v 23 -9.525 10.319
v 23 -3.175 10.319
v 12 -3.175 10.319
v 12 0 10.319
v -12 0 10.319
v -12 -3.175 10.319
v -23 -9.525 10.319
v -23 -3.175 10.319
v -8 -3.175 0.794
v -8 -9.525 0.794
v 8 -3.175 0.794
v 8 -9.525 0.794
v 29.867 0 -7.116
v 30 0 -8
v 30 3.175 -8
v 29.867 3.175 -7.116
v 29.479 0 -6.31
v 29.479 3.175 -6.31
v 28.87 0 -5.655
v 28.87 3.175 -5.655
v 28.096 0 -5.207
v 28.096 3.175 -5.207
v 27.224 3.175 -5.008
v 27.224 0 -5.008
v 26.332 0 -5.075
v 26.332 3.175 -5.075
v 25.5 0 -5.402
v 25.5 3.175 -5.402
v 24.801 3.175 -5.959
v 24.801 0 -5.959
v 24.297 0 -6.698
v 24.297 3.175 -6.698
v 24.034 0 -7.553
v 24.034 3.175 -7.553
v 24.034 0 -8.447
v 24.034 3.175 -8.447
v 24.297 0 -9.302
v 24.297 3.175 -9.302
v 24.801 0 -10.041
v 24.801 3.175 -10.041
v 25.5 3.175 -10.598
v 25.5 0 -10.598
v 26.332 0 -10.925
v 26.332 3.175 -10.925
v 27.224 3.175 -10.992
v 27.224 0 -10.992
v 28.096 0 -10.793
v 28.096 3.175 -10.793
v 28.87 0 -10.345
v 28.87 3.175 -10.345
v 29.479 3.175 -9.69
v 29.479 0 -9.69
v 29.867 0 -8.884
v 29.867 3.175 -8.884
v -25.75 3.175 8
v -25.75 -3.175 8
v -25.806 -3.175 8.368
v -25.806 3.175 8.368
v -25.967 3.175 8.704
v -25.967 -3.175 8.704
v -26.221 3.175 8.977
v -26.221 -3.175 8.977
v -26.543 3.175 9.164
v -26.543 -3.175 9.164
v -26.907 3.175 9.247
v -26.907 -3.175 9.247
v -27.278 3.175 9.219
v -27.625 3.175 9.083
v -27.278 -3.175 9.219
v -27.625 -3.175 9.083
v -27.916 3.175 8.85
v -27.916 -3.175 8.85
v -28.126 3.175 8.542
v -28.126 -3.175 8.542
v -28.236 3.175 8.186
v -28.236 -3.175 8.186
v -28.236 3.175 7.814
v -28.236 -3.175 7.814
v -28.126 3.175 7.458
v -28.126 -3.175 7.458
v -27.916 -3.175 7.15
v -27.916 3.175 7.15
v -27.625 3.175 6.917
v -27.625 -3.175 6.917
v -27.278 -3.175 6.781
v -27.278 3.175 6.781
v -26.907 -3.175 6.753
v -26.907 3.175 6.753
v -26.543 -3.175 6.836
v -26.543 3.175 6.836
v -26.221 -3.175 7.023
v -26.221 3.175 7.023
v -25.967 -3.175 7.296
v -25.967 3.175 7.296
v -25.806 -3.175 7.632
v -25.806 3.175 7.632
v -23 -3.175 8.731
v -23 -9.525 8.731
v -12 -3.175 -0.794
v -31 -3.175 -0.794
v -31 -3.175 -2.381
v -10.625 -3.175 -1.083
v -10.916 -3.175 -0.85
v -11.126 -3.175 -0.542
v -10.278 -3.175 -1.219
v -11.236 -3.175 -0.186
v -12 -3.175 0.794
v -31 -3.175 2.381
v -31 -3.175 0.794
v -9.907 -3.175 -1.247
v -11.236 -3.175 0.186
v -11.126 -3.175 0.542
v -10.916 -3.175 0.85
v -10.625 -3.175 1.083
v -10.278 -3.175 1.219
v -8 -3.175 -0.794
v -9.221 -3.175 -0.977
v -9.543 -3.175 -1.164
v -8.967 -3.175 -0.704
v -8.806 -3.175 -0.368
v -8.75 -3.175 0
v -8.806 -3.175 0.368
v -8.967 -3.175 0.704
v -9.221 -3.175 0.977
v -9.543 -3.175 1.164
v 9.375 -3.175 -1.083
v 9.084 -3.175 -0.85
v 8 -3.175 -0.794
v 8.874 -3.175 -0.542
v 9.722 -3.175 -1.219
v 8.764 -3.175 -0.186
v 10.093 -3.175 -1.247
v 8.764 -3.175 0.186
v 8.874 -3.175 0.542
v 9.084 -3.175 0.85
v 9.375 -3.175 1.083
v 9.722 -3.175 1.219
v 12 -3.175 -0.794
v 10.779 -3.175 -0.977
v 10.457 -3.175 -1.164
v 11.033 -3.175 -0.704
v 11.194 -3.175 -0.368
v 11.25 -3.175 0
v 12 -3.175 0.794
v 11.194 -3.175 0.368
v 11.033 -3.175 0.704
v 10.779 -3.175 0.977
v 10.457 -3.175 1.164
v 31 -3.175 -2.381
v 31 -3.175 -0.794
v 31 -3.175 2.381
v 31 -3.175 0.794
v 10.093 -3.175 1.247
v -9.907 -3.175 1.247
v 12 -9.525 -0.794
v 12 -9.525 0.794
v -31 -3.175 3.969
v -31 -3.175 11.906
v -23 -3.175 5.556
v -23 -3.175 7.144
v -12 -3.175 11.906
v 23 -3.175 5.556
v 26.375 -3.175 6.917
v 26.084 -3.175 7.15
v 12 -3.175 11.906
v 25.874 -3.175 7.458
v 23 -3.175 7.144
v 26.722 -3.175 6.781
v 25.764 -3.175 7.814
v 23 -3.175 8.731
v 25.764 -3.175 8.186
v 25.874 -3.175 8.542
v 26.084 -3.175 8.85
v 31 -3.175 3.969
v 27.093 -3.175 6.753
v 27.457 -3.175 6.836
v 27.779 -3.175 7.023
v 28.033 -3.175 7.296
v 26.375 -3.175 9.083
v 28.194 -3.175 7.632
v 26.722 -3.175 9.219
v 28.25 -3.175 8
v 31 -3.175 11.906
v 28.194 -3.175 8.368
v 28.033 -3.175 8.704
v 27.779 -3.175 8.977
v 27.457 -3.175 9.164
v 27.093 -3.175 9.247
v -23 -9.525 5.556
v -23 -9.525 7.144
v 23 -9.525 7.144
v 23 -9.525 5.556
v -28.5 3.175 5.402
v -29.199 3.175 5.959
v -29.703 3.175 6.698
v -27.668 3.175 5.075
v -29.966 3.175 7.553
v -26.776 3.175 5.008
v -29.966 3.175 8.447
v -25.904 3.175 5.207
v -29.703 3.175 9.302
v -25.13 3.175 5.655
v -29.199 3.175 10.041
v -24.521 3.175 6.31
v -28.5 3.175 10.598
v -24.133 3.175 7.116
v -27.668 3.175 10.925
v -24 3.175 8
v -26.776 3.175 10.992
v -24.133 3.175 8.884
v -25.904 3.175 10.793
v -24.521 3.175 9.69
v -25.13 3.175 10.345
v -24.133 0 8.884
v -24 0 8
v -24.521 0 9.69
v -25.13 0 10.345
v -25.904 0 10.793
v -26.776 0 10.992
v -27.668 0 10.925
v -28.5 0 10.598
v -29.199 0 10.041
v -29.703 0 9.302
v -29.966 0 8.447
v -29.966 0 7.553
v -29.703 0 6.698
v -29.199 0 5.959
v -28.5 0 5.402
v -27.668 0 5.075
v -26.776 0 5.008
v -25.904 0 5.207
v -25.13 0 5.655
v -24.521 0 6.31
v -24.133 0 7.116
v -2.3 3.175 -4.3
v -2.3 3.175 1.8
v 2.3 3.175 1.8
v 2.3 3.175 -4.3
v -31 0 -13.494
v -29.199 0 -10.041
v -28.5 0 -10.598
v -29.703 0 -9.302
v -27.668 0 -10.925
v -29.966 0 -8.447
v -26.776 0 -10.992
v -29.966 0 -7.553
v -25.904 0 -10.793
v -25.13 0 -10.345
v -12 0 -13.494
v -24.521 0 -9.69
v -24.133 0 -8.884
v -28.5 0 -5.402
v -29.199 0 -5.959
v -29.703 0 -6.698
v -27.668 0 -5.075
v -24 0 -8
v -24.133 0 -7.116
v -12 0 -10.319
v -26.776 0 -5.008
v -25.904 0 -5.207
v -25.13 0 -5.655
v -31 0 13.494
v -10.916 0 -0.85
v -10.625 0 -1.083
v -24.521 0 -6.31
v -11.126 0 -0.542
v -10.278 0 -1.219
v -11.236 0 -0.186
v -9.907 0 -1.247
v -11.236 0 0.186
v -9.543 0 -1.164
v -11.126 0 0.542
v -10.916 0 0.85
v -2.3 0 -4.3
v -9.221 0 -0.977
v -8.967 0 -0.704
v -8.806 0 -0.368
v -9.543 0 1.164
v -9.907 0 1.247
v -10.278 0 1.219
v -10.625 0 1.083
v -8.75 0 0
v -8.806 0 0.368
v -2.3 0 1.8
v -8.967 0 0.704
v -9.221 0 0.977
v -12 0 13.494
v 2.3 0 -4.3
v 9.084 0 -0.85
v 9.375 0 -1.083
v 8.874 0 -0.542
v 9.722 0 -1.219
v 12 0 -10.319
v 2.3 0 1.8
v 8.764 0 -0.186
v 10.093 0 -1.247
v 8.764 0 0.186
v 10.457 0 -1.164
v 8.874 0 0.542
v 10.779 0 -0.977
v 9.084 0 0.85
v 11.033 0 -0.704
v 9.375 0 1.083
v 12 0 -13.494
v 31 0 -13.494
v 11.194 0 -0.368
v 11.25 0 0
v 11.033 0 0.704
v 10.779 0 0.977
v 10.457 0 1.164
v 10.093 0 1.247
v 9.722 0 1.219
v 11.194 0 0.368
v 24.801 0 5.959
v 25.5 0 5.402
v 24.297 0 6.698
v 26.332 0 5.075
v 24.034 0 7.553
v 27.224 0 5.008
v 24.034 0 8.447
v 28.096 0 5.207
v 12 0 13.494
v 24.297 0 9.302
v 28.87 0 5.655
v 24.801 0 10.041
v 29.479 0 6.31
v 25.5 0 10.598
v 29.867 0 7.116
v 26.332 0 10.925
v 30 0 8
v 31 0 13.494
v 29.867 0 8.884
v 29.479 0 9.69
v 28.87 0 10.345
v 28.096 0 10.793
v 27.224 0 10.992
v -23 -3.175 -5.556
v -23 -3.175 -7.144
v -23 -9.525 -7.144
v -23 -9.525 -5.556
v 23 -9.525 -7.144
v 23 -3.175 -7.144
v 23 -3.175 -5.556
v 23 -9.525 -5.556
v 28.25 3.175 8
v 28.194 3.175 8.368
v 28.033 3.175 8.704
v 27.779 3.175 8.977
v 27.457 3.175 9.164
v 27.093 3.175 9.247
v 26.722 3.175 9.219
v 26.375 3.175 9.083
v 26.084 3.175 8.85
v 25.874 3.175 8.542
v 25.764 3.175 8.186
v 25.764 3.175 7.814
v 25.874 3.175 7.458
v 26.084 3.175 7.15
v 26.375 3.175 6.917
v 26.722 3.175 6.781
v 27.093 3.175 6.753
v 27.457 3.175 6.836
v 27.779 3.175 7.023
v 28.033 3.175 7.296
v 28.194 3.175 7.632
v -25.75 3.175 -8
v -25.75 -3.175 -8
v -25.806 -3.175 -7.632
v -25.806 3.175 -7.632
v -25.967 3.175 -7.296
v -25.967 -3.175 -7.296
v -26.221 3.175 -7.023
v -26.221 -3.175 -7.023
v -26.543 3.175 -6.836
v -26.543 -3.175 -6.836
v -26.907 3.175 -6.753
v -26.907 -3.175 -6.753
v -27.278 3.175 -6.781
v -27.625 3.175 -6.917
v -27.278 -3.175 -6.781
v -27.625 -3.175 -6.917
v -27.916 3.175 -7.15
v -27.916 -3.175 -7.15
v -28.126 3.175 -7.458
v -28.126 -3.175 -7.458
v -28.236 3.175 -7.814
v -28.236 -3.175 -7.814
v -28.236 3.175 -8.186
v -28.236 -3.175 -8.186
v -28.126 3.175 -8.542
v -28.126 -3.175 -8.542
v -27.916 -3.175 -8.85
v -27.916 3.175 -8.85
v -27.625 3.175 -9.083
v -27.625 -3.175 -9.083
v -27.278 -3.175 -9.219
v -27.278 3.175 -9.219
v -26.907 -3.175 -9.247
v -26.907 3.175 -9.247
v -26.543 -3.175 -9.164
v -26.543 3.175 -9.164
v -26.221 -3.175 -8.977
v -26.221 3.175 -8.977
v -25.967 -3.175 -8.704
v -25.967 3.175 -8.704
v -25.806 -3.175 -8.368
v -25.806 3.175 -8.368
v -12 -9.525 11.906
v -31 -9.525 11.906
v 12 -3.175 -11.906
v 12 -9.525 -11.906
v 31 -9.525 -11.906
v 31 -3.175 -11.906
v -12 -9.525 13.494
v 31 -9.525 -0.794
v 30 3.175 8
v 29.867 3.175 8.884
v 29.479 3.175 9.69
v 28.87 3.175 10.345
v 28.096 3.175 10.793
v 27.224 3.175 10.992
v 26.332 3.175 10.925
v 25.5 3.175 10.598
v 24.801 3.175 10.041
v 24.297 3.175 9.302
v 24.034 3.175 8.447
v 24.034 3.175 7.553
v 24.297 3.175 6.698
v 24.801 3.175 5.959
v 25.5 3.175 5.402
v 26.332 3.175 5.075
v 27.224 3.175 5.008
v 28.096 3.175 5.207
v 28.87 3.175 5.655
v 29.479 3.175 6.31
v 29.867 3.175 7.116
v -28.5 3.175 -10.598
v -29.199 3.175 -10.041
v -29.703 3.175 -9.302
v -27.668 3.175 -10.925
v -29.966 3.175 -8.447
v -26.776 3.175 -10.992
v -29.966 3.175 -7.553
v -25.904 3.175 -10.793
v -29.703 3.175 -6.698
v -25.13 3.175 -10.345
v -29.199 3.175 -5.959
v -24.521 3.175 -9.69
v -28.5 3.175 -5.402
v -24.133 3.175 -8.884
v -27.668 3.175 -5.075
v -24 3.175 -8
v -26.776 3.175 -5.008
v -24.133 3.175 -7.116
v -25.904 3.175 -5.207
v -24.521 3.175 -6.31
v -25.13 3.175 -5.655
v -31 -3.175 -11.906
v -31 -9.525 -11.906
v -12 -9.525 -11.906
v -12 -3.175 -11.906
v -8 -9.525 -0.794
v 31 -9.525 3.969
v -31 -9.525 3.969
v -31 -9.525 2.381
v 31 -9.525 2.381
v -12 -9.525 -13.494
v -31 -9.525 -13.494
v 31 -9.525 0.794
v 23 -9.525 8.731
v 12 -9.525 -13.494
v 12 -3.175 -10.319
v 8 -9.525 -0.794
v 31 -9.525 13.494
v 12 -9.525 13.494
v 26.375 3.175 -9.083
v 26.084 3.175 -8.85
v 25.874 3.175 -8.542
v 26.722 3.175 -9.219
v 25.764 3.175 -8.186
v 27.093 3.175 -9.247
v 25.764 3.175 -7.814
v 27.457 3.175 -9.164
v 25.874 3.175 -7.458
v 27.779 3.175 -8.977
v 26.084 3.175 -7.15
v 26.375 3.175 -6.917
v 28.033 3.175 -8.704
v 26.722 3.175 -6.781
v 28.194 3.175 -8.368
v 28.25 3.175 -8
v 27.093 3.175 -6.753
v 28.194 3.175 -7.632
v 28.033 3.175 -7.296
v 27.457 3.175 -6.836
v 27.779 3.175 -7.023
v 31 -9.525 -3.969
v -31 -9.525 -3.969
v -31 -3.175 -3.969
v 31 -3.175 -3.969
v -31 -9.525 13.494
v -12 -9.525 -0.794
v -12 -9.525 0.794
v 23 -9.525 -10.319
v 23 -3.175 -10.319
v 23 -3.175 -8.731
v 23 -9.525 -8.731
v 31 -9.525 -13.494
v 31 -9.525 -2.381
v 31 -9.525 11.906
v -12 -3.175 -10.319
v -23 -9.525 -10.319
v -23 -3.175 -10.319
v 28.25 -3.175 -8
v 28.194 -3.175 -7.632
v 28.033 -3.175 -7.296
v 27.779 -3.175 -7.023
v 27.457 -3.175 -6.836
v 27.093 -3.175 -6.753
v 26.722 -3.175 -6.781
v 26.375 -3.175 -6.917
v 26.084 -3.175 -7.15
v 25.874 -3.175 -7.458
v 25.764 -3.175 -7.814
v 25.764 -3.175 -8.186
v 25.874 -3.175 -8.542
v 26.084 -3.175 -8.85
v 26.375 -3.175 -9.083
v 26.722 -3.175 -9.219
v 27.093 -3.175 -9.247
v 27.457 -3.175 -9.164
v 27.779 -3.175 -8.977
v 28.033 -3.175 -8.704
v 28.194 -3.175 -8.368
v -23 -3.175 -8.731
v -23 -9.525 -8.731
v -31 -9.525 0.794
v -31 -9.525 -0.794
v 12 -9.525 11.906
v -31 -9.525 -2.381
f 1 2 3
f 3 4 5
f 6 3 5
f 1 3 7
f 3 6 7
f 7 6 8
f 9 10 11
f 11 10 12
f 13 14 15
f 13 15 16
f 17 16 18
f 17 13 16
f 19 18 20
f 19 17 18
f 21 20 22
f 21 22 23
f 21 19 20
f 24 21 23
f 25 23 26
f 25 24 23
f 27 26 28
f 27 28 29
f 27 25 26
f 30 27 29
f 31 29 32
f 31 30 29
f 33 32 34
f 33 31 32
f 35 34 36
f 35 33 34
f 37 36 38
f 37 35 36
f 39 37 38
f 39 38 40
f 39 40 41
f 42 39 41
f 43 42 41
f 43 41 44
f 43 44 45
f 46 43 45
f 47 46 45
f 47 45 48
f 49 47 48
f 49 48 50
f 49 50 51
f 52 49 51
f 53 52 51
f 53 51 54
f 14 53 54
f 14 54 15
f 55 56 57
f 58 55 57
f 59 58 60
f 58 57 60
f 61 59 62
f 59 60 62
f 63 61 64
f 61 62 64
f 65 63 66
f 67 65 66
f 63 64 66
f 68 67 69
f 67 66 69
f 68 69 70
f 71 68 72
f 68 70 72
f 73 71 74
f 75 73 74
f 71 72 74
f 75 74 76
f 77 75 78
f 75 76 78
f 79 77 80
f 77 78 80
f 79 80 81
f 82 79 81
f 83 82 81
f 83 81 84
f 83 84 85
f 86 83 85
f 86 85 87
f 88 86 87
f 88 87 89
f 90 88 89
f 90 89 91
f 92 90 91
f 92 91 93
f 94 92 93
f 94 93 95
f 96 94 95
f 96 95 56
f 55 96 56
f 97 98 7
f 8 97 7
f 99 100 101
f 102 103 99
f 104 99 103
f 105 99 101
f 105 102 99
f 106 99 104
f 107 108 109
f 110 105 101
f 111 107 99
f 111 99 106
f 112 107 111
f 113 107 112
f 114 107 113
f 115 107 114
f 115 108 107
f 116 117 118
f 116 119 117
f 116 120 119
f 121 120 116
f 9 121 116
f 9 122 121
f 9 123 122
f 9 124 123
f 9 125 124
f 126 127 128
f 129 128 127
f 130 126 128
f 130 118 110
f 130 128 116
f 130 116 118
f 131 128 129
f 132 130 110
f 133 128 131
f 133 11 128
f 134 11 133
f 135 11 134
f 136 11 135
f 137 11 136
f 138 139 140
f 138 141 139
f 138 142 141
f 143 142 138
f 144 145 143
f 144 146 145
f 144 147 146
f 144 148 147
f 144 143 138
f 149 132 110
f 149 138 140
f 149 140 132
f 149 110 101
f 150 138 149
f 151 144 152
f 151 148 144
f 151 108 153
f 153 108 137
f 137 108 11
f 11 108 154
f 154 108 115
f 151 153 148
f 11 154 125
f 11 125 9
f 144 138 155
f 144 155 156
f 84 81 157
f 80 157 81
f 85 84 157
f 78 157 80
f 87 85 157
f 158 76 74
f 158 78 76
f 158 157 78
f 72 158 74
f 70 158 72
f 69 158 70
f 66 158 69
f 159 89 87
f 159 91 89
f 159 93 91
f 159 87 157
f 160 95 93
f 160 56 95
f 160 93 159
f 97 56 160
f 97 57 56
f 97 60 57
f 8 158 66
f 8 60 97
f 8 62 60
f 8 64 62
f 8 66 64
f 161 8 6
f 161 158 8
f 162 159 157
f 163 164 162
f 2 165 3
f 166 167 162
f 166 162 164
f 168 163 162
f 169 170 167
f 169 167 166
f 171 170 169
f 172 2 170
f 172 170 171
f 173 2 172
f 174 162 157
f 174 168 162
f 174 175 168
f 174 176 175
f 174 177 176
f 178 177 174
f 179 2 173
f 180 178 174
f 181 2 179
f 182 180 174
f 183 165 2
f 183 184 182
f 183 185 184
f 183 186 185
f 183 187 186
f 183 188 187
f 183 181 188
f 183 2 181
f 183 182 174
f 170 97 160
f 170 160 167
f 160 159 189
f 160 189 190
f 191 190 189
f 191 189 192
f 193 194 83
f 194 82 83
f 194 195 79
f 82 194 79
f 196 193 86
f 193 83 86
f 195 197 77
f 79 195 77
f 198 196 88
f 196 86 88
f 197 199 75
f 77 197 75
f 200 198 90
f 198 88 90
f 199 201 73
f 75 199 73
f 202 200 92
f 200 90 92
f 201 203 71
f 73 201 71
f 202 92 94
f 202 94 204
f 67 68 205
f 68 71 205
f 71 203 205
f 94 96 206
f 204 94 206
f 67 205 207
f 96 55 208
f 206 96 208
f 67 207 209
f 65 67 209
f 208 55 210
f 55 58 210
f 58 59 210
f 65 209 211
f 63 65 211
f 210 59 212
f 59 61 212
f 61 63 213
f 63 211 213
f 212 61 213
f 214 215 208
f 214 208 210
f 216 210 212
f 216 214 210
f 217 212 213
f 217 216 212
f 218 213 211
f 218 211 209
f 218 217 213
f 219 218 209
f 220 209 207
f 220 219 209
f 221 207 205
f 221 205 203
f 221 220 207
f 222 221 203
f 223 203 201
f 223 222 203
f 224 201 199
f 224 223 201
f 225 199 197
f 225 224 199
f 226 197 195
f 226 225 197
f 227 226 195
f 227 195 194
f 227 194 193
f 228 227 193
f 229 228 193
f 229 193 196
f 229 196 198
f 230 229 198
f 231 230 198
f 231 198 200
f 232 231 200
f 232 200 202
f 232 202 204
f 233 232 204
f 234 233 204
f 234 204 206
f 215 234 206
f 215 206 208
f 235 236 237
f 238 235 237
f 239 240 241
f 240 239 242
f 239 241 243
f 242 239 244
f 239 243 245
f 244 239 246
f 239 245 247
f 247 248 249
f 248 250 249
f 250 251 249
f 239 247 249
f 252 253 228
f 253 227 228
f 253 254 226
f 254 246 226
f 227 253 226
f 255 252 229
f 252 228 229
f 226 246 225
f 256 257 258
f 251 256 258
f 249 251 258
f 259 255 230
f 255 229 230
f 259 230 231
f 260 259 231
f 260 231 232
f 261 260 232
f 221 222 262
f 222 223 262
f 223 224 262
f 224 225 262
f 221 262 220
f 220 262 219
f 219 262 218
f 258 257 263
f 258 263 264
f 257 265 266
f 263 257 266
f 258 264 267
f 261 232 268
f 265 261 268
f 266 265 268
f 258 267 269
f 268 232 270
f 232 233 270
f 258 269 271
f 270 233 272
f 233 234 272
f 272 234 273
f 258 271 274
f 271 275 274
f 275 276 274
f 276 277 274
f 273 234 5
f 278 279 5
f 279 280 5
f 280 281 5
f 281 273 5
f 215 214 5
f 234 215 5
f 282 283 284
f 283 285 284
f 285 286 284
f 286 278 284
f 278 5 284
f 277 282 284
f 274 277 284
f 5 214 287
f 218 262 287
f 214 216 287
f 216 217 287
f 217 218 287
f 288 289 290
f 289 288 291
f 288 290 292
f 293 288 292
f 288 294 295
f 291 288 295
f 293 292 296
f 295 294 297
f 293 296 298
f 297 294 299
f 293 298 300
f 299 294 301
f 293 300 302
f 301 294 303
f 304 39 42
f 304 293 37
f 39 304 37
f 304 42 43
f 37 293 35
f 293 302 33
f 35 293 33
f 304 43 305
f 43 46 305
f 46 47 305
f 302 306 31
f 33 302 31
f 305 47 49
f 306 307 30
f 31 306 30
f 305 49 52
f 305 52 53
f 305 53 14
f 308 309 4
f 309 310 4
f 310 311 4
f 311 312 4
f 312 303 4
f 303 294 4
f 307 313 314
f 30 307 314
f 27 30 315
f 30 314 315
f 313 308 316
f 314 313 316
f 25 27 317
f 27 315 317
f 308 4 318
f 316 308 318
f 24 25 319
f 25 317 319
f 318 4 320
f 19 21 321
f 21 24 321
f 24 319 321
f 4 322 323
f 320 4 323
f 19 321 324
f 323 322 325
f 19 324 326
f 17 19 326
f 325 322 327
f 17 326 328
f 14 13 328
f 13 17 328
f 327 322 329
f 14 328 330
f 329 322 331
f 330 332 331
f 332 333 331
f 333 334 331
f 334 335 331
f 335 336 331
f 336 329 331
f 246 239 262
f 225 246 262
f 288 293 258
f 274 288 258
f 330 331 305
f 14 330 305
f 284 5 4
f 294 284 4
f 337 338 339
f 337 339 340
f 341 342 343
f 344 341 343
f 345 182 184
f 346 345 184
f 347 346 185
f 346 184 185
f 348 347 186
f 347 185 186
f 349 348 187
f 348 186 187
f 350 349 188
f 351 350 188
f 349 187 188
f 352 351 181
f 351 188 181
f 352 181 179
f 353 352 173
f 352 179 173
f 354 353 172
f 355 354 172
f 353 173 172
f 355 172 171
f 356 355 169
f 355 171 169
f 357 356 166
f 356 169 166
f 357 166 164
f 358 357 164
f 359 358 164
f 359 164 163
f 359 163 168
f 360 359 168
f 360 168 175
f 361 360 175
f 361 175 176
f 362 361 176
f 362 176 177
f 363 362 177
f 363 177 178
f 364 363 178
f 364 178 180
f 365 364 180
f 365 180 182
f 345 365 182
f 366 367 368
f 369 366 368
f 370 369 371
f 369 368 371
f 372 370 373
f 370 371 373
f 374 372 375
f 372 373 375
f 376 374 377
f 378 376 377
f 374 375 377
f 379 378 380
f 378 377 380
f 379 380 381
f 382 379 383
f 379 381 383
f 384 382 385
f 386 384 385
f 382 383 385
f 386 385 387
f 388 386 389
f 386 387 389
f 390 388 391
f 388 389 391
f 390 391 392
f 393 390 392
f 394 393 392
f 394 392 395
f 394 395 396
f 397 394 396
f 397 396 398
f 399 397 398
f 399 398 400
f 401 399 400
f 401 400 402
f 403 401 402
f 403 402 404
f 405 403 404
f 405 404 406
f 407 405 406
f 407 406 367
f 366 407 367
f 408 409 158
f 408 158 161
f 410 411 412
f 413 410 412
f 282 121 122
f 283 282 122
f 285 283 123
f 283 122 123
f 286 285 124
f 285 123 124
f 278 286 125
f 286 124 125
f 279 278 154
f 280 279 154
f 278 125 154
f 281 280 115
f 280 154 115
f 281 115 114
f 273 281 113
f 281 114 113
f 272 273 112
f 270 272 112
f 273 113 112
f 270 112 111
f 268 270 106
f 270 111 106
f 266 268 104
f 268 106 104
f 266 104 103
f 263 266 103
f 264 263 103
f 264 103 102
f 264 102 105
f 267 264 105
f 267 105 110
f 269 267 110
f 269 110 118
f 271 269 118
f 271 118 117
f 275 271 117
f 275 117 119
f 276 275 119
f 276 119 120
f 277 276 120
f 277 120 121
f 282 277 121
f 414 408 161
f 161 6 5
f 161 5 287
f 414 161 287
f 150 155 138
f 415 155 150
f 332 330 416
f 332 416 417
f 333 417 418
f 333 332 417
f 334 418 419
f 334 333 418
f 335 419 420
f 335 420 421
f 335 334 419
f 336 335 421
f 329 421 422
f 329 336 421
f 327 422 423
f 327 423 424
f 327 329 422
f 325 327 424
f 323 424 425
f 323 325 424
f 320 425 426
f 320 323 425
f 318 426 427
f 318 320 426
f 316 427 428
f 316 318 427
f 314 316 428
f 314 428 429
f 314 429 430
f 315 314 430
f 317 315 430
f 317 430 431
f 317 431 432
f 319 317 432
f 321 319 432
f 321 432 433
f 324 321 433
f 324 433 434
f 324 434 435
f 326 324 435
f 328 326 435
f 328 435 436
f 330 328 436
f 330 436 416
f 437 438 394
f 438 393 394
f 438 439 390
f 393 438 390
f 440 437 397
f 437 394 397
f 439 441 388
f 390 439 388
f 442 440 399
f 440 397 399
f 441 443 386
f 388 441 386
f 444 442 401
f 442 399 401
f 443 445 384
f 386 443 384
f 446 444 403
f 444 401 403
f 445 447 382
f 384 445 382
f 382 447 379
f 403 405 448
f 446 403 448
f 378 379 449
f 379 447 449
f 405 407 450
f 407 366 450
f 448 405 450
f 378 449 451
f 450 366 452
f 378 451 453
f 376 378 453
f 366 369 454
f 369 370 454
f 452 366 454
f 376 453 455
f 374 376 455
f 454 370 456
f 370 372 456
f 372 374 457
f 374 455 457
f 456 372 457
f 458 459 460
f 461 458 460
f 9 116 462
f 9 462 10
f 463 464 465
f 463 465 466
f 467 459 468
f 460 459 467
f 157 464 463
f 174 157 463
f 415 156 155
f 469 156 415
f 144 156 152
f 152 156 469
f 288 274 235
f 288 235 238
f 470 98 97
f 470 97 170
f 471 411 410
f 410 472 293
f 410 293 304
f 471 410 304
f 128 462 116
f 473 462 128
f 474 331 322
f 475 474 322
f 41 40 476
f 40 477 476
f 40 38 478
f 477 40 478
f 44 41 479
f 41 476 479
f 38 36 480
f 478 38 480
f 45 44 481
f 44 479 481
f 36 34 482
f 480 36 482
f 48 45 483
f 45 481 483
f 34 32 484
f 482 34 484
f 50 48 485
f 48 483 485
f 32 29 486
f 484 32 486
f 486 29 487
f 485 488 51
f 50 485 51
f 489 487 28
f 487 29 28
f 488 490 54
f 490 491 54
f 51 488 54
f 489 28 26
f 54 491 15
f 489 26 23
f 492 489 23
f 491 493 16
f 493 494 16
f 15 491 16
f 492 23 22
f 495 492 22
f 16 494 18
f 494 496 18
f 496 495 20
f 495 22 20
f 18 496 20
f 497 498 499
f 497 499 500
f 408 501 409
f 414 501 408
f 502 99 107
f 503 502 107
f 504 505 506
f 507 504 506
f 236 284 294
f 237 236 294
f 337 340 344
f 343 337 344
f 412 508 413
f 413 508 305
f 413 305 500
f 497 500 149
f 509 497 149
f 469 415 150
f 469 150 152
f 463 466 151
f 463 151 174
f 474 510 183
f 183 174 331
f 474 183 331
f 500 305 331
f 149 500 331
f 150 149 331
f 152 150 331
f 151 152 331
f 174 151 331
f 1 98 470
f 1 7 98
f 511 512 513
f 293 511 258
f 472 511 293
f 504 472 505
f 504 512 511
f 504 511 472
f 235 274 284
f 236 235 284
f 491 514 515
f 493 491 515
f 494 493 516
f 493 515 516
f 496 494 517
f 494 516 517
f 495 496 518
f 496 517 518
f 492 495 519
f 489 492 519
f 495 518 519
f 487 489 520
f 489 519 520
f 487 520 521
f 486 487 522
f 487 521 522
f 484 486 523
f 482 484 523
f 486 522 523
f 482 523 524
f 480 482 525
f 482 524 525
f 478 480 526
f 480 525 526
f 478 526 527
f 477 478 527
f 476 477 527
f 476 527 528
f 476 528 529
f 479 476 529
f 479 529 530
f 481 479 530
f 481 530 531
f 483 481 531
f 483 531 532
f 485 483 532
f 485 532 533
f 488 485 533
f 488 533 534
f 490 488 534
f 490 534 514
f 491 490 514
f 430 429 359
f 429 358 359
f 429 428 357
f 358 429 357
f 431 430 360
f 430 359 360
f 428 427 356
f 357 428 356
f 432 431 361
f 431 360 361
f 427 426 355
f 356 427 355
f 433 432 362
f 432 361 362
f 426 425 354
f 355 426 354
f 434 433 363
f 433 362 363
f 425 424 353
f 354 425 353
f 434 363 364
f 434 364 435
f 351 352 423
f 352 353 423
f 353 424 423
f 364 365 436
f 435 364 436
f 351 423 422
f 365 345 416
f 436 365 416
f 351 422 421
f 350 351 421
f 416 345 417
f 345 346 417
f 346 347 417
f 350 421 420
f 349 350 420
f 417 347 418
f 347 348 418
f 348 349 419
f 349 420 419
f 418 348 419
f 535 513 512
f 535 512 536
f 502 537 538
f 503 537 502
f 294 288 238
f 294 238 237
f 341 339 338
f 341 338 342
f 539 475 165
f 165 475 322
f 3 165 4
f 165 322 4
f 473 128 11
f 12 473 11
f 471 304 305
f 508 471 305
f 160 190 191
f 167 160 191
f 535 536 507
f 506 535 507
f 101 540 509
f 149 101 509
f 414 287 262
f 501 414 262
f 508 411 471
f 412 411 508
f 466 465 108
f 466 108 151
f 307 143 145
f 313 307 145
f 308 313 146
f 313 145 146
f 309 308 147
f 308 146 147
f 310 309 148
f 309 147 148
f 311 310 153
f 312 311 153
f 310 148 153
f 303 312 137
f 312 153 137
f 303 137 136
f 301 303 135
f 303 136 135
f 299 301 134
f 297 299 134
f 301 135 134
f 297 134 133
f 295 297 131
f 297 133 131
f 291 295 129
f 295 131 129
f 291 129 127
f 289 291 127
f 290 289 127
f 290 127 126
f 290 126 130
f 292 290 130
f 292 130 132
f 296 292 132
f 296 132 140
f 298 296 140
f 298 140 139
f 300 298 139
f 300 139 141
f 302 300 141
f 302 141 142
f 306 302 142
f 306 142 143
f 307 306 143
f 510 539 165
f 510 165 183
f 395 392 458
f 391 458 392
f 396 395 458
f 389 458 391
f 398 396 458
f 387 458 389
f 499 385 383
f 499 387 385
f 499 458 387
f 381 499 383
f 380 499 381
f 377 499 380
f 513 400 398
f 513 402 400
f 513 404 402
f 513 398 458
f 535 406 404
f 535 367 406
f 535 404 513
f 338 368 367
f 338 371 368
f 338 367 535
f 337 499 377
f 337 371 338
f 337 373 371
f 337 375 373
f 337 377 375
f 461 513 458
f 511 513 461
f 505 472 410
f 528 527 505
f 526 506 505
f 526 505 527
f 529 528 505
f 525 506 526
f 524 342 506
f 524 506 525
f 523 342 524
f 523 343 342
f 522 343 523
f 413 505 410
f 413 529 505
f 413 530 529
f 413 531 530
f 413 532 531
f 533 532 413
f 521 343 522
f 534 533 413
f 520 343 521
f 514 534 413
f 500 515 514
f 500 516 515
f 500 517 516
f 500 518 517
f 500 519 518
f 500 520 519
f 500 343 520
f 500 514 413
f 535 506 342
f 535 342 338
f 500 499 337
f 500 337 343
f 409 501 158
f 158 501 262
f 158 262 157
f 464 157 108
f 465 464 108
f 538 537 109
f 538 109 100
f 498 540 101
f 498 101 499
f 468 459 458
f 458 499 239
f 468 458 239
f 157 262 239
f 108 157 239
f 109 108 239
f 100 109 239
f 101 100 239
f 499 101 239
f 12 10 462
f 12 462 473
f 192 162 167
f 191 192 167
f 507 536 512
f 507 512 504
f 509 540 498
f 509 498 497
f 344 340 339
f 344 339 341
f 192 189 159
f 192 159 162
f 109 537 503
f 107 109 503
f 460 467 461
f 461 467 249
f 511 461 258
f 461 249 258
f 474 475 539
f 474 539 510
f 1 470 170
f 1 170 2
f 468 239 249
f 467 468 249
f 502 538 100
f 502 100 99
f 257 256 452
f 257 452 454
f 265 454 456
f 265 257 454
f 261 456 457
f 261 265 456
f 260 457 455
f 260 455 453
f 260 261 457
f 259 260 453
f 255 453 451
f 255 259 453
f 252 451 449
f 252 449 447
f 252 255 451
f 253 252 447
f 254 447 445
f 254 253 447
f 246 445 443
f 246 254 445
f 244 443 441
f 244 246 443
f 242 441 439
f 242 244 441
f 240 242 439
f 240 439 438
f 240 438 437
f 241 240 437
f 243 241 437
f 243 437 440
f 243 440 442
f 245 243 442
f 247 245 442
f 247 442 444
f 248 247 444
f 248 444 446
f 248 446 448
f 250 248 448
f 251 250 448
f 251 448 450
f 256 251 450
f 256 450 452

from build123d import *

# Parameters (mm, degrees)
F1_DEPTH = 9.525
F2_W     = 19
F2_H     = 1.5875
F2_W_2   = 62
F4_DEPTH = 6.35
F5_R     = 3
F5_R_2   = 1.25
F5_W     = 4.6
F5_H     = 6.1
F7_DEPTH = 6.35
F5_W_2   = 8
F5_H_2   = 7
F5_W_3   = 4
F5_H_3   = 4
F8_DEPTH = 6.351
F9_DEPTH = 6.351


with BuildPart() as f1:
    # F0 (on Front) → F1 (new body)
    with BuildSketch(Plane.XZ):
        Polygon((-12, 13.4935), (-31, 13.4935), (-31, -13.4935), (-12, -13.4935), (-12, -10.31875), (0, -10.31875), (12, -10.31875), (12, -13.4935), (31, -13.4935), (31, 13.4935), (12, 13.4935), (12, 10.31875), (0, 10.31875), (-12, 10.31875), align=None)
    extrude(amount=F1_DEPTH)

    # F2 (on face) → F4 (cut, through all)
    with BuildSketch(Plane.XZ.offset(9.525)):
        with Locations((-21.5, 11.1125)):
            Rectangle(F2_W, F2_H)
        with Locations((21.5, 11.1125)):
            Rectangle(F2_W, F2_H)
        with Locations((0, 7.9375)):
            Rectangle(F2_W_2, F2_H)
        with Locations((0, 4.7625)):
            Rectangle(F2_W_2, F2_H)
        with Locations((0, 1.5875)):
            Rectangle(F2_W_2, F2_H)
        with Locations((0, -1.5875)):
            Rectangle(F2_W_2, F2_H)
        with Locations((0, -4.7625)):
            Rectangle(F2_W_2, F2_H)
        with Locations((0, -7.9375)):
            Rectangle(F2_W_2, F2_H)
        with Locations((-21.5, -11.1125)):
            Rectangle(F2_W, F2_H)
        with Locations((21.5, -11.1125)):
            Rectangle(F2_W, F2_H)
    extrude(amount=-F4_DEPTH, mode=Mode.SUBTRACT)

    # F5 (on offset) → F7 (join, through all)
    with BuildSketch(Plane.XZ.offset(3.175)):
        with Locations((-27, 8)):
            Circle(F5_R)
        with Locations((-27, 8)):
            Circle(F5_R_2, mode=Mode.SUBTRACT)
        with Locations((-27, -8)):
            Circle(F5_R)
        with Locations((-27, -8)):
            Circle(F5_R_2, mode=Mode.SUBTRACT)
        with Locations((27, 8)):
            Circle(F5_R)
        with Locations((27, 8)):
            Circle(F5_R_2, mode=Mode.SUBTRACT)
        with Locations((27, -8)):
            Circle(F5_R)
        with Locations((27, -8)):
            Circle(F5_R_2, mode=Mode.SUBTRACT)
        with Locations((0, -1.25)):
            Rectangle(F5_W, F5_H)
    extrude(amount=-F7_DEPTH)

    # F5 (on offset) → F8 (cut, through all)
    with BuildSketch(Plane.XZ.offset(3.175)):
        with Locations((-27, 8)):
            Rectangle(F5_W_2, F5_H_2)
        with Locations((-27, 8)):
            Circle(F5_R, mode=Mode.SUBTRACT)
        with Locations((-27, -8)):
            Rectangle(F5_W_2, F5_H_2)
        with Locations((-27, -8)):
            Circle(F5_R, mode=Mode.SUBTRACT)
        with Locations((27, 8)):
            Rectangle(F5_W_2, F5_H_2)
        with Locations((27, 8)):
            Circle(F5_R, mode=Mode.SUBTRACT)
        with Locations((27, -8)):
            Rectangle(F5_W_2, F5_H_2)
        with Locations((27, -8)):
            Circle(F5_R, mode=Mode.SUBTRACT)
        with Locations((-27, 8)):
            Circle(F5_R)
        with Locations((-27, 8)):
            Circle(F5_R_2, mode=Mode.SUBTRACT)
        with Locations((-27, -8)):
            Circle(F5_R)
        with Locations((-27, -8)):
            Circle(F5_R_2, mode=Mode.SUBTRACT)
        with Locations((27, 8)):
            Circle(F5_R)
        with Locations((27, 8)):
            Circle(F5_R_2, mode=Mode.SUBTRACT)
        with Locations((27, -8)):
            Circle(F5_R)
        with Locations((27, -8)):
            Circle(F5_R_2, mode=Mode.SUBTRACT)
        with Locations((-10, 0)):
            Rectangle(F5_W_3, F5_H_3)
        with Locations((-10, 0)):
            Circle(F5_R_2, mode=Mode.SUBTRACT)
        with Locations((10, 0)):
            Rectangle(F5_W_3, F5_H_3)
        with Locations((10, 0)):
            Circle(F5_R_2, mode=Mode.SUBTRACT)
        with Locations((-27, 8)):
            Circle(F5_R_2)
        with Locations((-27, -8)):
            Circle(F5_R_2)
        with Locations((-10, 0)):
            Circle(F5_R_2)
        with Locations((27, 8)):
            Circle(F5_R_2)
        with Locations((27, -8)):
            Circle(F5_R_2)
        with Locations((10, 0)):
            Circle(F5_R_2)
    extrude(amount=F8_DEPTH, mode=Mode.SUBTRACT)

    # F5 (on offset) → F9 (cut, through all)
    with BuildSketch(Plane.XZ.offset(3.175)):
        with Locations((-27, 8)):
            Circle(F5_R_2)
        with Locations((-27, -8)):
            Circle(F5_R_2)
        with Locations((27, 8)):
            Circle(F5_R_2)
        with Locations((27, -8)):
            Circle(F5_R_2)
        with Locations((-10, 0)):
            Circle(F5_R_2)
        with Locations((10, 0)):
            Circle(F5_R_2)
    extrude(amount=-F9_DEPTH, mode=Mode.SUBTRACT)


solid = f1.part
